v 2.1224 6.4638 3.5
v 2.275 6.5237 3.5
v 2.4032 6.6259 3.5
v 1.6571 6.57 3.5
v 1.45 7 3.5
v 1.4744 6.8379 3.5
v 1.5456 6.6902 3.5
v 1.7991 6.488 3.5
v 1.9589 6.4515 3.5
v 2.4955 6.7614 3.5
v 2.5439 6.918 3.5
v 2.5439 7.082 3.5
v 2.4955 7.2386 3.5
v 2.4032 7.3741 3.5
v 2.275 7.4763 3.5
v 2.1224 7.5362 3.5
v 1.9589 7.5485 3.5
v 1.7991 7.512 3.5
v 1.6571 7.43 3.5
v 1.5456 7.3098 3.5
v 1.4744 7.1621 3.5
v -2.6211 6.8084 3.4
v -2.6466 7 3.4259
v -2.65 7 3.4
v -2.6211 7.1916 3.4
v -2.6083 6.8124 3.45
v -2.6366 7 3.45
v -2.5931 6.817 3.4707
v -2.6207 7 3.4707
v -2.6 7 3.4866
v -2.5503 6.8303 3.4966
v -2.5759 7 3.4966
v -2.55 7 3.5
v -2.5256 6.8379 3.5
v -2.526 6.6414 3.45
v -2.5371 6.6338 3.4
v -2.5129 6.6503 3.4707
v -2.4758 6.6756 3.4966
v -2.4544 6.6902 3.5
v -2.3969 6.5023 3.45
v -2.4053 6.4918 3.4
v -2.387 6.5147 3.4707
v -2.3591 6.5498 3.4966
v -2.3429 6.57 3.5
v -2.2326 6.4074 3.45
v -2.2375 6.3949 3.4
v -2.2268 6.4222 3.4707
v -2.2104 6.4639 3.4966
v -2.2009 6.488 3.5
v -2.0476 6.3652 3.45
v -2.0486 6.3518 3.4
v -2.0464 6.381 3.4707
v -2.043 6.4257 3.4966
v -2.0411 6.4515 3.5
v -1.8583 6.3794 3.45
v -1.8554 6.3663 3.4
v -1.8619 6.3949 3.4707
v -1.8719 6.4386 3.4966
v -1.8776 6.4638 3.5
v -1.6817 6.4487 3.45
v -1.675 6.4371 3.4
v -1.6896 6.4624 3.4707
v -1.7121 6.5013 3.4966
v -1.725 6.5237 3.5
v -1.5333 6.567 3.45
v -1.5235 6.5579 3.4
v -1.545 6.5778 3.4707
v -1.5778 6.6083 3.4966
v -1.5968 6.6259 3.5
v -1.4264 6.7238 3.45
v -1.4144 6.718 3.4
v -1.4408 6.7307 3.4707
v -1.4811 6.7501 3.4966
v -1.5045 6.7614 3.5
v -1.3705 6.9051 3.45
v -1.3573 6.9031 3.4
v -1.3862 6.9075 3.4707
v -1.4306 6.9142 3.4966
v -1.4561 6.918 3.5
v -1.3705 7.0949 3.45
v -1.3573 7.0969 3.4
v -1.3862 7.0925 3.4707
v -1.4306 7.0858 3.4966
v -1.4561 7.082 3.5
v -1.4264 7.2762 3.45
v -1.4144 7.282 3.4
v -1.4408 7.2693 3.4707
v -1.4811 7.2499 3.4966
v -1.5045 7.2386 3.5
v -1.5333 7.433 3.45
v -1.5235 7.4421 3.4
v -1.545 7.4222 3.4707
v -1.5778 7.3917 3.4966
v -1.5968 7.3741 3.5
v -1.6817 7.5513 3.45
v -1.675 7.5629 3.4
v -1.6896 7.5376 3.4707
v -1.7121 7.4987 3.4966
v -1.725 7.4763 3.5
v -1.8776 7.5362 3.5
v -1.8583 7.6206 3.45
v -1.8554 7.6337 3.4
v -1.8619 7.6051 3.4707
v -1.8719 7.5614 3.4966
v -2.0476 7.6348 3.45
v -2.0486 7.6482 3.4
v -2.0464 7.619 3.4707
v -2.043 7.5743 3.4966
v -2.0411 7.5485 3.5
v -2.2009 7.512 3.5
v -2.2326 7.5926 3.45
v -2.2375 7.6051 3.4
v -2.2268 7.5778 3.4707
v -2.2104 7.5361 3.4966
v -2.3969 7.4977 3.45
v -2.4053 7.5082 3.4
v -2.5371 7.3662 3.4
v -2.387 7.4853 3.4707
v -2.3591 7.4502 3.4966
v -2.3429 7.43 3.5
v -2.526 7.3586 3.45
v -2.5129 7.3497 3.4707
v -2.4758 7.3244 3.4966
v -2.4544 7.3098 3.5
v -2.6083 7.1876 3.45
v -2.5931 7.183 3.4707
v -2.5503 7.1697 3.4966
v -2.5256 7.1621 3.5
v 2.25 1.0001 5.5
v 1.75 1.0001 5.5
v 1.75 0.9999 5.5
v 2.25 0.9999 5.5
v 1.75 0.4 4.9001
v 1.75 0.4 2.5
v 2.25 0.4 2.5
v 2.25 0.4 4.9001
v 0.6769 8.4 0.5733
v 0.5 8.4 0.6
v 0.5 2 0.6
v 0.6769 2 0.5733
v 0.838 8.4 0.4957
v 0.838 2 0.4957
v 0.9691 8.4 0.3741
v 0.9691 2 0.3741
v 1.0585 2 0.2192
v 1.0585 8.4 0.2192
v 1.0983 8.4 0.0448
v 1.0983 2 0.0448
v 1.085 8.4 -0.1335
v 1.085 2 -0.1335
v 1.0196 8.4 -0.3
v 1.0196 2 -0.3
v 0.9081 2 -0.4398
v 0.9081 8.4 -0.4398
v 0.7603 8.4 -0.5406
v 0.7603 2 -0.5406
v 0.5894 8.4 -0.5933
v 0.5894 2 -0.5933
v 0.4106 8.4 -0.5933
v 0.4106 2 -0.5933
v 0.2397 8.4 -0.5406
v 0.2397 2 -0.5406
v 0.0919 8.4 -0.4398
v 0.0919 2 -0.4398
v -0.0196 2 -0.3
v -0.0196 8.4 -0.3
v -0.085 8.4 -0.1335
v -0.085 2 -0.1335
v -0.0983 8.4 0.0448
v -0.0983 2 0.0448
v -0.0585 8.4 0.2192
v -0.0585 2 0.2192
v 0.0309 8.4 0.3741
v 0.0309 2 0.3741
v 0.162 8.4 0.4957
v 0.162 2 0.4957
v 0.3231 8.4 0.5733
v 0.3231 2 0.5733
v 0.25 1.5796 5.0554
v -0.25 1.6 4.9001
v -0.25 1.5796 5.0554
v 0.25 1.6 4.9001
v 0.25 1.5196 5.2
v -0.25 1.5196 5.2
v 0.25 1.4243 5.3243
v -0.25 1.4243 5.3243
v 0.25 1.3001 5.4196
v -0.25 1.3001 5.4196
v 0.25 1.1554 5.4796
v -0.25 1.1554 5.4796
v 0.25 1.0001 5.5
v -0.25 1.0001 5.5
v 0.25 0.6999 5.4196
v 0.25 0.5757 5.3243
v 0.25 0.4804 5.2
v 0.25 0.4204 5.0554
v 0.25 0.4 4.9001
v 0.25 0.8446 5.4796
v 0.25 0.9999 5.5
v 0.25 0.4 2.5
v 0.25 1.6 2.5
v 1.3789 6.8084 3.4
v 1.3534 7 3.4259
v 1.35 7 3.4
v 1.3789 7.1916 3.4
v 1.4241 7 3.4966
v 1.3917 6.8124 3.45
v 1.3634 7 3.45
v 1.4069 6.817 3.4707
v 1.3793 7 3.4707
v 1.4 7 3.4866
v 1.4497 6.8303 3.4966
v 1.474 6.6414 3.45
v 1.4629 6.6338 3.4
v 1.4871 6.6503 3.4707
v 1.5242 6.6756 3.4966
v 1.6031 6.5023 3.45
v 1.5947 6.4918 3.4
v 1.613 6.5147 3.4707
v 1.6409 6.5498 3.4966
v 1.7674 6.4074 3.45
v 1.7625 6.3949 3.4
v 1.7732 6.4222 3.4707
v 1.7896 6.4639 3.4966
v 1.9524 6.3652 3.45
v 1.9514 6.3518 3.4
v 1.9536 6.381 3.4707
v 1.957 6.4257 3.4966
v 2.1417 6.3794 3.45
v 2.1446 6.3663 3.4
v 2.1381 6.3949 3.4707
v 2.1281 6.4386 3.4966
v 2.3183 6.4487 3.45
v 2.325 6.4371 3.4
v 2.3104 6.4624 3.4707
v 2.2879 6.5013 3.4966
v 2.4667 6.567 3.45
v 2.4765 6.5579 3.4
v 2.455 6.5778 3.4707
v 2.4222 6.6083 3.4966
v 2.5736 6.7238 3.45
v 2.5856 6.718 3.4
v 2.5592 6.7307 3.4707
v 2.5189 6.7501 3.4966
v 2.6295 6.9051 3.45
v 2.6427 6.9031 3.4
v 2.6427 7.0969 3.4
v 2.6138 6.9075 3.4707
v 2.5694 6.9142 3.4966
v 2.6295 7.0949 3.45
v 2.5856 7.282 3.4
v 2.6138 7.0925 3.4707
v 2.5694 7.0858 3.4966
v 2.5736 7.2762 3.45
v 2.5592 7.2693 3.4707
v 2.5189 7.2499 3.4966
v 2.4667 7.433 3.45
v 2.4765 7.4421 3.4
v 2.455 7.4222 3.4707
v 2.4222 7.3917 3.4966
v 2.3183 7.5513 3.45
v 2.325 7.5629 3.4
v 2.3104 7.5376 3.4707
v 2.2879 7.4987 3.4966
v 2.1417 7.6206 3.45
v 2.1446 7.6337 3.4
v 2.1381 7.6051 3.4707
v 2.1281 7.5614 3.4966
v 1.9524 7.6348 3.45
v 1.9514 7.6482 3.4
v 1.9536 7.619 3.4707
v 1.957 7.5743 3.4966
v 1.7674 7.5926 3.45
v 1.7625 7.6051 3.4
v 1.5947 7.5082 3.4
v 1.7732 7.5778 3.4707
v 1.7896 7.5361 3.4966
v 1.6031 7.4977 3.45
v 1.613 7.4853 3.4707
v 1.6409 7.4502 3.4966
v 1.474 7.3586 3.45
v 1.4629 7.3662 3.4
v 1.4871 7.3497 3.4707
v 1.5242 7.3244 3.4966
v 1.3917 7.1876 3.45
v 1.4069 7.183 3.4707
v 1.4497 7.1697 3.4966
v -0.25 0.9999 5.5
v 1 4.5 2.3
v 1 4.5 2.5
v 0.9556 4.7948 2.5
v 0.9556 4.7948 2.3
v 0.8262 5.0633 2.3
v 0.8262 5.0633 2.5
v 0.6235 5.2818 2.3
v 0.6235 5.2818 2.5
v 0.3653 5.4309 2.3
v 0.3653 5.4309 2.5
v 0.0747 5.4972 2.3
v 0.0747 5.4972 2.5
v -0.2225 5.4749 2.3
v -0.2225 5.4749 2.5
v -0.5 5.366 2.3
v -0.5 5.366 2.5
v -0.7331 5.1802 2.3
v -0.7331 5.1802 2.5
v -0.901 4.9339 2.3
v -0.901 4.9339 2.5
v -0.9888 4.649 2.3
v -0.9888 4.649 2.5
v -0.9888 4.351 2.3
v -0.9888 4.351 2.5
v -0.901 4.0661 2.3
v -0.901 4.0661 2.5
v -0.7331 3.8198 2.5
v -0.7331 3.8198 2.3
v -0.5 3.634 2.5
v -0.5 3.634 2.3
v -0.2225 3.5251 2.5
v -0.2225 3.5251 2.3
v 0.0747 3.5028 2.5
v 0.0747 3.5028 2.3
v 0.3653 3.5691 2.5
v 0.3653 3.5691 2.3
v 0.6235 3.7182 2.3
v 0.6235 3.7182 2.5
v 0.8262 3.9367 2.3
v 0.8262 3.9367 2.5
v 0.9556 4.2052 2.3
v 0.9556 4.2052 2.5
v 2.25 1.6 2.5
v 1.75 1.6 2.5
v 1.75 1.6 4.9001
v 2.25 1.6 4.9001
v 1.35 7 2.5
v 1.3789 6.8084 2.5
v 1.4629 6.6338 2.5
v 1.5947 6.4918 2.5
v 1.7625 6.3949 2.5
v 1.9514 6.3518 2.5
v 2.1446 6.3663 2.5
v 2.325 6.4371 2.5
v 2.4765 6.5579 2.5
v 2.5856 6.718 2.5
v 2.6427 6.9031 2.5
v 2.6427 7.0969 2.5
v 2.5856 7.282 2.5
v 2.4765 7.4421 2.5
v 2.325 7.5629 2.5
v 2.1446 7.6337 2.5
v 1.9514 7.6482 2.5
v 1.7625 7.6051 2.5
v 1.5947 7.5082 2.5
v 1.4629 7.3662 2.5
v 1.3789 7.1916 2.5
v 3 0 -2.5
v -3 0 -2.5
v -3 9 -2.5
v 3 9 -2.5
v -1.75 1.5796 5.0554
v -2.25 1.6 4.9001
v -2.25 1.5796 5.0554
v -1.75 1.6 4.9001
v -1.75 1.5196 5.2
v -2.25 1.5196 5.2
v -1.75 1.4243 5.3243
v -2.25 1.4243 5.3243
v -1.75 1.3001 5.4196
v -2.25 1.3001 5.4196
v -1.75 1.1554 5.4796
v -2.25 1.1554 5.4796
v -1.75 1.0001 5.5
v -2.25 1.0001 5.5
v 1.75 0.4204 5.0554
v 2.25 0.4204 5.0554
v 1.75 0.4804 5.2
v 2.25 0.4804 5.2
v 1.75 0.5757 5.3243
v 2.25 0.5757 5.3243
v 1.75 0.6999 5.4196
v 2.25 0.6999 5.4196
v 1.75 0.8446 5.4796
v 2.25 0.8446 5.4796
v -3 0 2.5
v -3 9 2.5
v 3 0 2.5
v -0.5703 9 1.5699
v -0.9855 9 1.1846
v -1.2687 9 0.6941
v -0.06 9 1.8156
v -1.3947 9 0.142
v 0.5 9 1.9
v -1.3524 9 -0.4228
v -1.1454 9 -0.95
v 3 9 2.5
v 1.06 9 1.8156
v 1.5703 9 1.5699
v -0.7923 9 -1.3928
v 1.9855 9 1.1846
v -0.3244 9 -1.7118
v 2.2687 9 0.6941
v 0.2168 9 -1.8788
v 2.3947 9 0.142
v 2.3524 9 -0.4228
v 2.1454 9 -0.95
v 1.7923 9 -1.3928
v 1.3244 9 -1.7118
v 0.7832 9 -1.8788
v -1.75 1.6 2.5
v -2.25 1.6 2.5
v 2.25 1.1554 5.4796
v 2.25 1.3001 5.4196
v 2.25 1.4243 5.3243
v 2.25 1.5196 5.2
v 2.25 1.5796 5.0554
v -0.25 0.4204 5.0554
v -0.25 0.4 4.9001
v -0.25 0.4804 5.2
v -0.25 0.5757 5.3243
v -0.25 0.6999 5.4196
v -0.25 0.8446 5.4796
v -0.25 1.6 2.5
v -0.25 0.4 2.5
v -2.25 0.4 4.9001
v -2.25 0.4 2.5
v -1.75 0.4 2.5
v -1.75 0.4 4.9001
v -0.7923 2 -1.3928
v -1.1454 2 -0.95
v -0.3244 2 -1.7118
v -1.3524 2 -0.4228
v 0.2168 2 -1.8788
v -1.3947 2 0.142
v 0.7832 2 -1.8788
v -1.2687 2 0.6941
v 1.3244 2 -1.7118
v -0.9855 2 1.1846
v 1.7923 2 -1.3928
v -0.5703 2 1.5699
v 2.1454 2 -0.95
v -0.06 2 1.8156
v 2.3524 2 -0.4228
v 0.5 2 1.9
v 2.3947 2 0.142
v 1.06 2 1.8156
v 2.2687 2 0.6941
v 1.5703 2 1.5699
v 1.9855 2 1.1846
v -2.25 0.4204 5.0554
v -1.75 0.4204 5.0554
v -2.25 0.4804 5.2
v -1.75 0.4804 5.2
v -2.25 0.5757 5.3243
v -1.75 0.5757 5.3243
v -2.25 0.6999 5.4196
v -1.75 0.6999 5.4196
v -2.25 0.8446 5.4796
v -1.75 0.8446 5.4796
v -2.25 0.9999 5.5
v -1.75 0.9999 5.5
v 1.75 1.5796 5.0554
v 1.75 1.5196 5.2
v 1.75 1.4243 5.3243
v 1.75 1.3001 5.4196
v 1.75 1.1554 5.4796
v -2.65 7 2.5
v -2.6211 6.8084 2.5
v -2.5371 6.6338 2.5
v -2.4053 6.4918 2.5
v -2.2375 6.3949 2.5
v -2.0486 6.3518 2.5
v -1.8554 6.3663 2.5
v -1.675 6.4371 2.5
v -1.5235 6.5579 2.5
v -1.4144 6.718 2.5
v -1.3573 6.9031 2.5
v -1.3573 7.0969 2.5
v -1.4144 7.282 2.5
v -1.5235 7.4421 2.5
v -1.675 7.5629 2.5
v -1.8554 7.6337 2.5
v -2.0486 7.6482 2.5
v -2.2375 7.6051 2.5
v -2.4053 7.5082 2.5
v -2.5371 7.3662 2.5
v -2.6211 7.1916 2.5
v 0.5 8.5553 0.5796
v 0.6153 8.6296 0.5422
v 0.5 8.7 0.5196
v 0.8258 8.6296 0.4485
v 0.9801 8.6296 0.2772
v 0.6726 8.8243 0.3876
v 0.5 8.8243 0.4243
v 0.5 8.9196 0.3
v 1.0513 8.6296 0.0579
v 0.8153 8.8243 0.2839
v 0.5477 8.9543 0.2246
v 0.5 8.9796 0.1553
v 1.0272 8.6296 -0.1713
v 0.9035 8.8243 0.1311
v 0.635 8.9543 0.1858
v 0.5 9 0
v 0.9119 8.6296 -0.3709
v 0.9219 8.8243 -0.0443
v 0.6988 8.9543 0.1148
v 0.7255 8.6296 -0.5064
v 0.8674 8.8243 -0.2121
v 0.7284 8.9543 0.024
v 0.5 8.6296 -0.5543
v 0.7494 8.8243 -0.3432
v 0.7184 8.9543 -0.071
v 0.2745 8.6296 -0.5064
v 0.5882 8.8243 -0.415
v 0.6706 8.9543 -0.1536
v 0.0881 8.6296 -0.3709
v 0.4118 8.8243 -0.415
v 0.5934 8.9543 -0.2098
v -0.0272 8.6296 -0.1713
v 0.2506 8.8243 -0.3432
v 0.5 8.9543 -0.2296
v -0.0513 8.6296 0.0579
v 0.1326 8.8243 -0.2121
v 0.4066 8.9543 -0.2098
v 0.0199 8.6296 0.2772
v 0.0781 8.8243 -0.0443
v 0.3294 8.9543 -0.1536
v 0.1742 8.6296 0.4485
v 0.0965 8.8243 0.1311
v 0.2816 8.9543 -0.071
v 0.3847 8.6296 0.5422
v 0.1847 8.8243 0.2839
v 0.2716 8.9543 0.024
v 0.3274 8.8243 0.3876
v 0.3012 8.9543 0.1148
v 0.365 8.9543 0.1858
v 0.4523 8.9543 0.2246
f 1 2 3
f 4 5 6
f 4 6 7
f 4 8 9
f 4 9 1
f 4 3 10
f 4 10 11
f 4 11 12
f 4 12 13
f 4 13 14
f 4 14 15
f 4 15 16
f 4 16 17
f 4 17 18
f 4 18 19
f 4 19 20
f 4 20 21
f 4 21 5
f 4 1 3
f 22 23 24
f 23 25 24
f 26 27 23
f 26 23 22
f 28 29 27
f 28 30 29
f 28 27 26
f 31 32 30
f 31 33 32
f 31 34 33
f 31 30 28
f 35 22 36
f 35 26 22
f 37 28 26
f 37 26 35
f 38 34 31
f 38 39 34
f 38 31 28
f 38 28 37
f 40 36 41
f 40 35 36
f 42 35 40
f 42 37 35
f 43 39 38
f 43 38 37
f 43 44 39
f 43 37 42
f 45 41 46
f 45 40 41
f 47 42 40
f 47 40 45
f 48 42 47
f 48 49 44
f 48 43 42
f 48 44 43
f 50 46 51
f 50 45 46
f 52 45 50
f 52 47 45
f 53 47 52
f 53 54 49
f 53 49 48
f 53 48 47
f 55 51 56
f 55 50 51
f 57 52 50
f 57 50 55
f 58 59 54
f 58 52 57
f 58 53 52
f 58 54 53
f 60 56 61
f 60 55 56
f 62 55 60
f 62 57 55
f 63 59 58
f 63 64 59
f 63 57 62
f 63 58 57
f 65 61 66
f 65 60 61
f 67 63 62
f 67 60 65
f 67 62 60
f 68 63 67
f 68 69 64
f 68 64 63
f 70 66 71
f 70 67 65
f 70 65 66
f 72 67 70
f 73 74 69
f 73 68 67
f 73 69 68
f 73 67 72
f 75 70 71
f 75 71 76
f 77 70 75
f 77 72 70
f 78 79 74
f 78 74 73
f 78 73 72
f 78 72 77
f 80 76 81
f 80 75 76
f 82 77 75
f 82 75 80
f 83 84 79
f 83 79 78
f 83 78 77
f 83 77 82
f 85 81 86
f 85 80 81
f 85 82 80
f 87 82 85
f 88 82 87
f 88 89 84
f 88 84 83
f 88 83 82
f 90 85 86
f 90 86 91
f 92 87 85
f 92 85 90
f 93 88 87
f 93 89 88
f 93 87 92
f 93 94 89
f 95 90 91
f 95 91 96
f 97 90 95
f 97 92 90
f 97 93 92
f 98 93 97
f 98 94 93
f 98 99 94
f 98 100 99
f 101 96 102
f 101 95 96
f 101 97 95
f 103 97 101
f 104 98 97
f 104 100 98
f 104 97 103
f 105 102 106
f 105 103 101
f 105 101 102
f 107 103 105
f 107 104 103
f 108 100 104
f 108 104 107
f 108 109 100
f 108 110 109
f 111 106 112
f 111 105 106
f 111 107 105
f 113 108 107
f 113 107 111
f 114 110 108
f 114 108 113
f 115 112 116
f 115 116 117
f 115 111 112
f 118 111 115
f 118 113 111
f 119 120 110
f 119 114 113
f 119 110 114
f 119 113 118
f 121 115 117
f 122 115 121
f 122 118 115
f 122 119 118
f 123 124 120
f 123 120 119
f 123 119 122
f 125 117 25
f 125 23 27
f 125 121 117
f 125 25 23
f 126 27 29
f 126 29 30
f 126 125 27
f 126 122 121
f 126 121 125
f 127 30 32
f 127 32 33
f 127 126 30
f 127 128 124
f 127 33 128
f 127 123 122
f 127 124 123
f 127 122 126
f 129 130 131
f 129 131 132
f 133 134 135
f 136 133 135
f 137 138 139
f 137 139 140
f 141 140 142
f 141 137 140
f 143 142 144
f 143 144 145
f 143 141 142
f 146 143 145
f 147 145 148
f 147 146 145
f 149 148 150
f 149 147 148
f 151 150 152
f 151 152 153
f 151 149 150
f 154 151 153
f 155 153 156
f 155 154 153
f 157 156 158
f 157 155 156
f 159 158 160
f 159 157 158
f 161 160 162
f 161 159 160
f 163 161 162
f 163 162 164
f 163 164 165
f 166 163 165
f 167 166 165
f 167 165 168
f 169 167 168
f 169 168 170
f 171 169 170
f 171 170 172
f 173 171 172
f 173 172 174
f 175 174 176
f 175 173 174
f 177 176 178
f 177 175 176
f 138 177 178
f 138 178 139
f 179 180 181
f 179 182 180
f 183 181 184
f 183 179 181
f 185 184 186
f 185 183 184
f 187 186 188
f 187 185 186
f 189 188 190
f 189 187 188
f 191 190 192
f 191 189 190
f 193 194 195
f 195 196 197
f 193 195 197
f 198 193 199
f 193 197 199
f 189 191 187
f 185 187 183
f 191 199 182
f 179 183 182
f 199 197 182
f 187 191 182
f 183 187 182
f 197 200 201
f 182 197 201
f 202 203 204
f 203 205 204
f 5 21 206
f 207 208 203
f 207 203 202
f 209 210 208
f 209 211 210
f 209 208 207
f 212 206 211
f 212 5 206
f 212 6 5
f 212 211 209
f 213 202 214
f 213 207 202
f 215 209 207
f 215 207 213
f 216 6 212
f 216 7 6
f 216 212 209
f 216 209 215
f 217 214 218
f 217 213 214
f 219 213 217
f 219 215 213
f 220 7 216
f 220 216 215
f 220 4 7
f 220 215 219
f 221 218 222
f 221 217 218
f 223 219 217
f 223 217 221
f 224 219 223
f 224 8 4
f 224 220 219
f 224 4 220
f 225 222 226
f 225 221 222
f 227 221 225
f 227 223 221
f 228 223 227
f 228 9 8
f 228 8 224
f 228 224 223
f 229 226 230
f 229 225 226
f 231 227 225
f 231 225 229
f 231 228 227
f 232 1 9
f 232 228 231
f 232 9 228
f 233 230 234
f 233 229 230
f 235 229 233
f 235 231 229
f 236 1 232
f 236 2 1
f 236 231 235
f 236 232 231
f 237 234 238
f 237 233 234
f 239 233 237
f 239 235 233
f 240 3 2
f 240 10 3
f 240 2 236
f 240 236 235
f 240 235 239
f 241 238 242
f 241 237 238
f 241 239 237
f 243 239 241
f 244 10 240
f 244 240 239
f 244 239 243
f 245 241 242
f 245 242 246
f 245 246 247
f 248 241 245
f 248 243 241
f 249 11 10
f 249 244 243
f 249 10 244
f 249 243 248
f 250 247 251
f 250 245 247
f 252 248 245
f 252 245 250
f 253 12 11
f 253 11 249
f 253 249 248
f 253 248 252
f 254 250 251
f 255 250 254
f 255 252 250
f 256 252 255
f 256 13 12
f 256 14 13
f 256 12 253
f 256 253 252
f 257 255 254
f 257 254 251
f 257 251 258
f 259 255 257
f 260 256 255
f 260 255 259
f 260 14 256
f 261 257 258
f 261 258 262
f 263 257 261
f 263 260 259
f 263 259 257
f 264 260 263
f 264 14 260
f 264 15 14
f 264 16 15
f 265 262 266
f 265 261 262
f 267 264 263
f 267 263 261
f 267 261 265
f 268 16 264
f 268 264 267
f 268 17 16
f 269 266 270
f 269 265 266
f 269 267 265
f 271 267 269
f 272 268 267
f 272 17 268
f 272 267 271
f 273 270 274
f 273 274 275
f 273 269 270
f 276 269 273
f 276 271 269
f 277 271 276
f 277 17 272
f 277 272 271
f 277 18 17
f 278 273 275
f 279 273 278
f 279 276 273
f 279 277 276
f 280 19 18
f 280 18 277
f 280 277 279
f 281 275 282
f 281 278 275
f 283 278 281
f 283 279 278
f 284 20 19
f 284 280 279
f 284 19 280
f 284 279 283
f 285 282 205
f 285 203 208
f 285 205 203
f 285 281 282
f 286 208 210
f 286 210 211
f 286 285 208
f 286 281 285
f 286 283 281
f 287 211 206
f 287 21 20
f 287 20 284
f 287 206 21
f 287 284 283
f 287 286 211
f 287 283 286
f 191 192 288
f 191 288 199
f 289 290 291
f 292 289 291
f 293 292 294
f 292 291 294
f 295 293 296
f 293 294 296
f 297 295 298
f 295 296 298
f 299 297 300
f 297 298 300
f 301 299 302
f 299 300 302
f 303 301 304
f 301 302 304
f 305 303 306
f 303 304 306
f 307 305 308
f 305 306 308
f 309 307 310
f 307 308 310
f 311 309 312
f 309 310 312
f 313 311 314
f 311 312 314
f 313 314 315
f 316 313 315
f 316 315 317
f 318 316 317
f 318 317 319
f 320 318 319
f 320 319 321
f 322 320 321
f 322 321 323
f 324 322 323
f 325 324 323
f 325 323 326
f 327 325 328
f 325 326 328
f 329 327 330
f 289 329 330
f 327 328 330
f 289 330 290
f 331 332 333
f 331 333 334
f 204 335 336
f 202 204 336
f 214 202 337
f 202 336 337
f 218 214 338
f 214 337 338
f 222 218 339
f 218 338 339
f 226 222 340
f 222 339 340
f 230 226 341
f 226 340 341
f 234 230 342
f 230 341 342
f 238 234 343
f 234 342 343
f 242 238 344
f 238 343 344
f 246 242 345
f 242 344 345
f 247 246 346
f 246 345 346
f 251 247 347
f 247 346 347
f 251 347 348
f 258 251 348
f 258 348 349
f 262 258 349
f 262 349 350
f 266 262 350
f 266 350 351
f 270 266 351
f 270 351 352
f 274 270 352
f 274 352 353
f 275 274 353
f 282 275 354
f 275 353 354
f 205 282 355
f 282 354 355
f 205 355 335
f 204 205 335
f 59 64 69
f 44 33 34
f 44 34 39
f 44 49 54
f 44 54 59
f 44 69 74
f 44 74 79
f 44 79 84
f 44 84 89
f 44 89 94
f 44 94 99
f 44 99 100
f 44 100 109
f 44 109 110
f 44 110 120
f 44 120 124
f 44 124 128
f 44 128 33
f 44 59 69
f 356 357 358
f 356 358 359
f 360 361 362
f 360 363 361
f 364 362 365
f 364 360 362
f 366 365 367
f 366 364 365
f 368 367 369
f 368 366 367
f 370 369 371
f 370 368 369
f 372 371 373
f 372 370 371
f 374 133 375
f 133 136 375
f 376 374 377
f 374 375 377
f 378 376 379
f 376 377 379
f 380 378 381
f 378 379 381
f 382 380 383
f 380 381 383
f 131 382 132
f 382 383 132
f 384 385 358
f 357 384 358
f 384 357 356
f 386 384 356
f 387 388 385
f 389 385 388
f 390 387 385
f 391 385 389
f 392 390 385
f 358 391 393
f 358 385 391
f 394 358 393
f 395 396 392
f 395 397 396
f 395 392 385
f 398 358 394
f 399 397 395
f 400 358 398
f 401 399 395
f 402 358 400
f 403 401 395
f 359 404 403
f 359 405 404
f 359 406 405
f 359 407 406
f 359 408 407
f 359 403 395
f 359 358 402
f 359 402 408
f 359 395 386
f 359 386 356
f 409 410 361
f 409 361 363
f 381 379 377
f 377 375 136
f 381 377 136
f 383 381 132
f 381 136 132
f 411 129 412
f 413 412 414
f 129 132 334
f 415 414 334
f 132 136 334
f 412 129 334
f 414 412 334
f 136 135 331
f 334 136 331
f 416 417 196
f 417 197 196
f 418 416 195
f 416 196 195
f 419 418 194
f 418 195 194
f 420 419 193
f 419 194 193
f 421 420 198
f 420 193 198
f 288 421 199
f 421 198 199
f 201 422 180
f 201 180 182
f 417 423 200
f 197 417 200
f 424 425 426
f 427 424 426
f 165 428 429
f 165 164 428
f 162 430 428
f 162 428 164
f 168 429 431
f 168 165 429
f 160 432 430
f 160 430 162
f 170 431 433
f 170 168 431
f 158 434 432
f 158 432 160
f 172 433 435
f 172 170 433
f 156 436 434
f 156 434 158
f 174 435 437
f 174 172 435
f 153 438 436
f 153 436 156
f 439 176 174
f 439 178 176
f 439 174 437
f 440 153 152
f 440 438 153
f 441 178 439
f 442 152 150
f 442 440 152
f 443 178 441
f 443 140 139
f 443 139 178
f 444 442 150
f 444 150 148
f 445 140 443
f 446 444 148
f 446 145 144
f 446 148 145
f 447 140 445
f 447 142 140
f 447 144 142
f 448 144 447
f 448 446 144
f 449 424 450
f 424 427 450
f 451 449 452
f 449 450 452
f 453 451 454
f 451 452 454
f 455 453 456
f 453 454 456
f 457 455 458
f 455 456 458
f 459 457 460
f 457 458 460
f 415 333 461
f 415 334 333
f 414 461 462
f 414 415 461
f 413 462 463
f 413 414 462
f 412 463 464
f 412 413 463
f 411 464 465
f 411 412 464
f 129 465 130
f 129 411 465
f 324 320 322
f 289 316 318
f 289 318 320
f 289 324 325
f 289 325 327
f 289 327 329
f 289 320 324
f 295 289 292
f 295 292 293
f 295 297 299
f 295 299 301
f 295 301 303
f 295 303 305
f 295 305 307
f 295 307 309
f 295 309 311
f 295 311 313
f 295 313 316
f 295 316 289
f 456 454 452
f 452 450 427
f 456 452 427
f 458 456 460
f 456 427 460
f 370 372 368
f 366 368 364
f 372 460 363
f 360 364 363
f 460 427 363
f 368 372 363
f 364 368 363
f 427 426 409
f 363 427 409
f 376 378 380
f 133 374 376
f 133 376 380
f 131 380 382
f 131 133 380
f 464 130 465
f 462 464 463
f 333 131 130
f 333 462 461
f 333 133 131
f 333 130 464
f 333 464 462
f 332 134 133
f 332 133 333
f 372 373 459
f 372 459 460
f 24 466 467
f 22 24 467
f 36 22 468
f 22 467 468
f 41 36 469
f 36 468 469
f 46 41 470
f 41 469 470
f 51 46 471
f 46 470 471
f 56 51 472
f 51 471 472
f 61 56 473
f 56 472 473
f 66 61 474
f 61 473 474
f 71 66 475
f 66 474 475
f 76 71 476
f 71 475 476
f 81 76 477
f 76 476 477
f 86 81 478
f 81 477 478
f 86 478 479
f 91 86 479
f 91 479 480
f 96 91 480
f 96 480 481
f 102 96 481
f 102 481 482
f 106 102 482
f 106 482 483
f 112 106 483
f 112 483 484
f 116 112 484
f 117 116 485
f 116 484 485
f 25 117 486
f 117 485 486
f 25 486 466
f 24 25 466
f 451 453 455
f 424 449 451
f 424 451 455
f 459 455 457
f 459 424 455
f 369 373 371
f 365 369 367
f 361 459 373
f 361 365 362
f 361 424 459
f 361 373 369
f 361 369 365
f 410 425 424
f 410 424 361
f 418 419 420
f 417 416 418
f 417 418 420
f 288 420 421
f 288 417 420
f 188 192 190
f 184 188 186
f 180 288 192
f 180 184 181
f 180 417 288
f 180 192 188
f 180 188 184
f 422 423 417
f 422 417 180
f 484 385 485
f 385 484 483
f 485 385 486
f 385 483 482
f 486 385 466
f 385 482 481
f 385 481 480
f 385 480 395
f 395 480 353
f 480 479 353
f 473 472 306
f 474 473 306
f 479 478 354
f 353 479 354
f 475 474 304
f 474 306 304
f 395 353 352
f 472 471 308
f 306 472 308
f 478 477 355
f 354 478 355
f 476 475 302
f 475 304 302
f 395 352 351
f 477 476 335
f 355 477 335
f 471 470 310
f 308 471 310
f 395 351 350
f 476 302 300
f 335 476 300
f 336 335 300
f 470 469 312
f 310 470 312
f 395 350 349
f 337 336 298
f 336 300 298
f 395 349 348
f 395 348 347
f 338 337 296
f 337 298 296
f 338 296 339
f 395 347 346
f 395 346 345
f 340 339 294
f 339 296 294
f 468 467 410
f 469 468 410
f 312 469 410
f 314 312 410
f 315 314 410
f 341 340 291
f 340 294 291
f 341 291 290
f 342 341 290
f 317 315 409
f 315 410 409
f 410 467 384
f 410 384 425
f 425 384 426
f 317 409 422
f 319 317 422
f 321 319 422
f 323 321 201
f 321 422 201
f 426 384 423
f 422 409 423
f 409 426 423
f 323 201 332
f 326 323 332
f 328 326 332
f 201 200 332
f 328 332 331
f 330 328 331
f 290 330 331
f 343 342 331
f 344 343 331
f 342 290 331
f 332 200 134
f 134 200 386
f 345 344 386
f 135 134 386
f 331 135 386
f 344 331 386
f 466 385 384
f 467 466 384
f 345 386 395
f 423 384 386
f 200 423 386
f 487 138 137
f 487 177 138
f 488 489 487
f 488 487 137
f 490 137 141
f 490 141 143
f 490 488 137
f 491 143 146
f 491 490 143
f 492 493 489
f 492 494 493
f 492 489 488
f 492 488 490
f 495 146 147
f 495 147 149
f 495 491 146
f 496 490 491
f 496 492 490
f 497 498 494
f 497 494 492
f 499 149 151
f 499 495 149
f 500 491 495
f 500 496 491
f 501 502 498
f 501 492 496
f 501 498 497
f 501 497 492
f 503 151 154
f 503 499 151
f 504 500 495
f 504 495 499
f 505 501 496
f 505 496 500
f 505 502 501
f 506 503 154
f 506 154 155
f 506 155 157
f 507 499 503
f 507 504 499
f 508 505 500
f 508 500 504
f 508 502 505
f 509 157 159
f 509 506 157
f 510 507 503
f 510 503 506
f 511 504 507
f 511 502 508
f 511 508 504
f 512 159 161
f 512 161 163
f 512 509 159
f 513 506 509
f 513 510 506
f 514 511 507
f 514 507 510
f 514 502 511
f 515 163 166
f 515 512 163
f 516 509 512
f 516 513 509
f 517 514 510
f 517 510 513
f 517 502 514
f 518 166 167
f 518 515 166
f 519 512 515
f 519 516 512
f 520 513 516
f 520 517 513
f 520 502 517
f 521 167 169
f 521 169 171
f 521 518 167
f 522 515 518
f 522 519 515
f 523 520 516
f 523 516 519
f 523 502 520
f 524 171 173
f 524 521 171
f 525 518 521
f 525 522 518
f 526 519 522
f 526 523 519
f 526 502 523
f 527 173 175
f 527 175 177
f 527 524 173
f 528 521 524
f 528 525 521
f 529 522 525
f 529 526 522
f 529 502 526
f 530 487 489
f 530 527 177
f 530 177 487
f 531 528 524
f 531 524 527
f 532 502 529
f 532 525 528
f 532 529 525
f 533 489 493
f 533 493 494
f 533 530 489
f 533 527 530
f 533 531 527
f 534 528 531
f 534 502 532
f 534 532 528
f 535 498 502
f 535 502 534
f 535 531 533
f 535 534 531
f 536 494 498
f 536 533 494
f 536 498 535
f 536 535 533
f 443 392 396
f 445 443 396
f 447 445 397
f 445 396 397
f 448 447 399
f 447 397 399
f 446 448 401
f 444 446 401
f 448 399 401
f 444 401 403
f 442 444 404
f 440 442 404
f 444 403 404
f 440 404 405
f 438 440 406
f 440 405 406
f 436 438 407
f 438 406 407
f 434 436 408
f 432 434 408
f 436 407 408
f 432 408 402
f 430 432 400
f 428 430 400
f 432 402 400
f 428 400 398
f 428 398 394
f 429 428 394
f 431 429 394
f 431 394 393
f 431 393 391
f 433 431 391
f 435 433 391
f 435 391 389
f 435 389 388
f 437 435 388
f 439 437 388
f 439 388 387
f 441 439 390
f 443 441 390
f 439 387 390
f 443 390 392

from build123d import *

# Parameters (mm, degrees)
SKETCH2_W           = 6
SKETCH2_H           = 5
BOSS_EXTRUDE1_DEPTH = 9
SKETCH3_R           = 1.9
SKETCH3_R_2         = 0.6
CUT_EXTRUDE1_DEPTH  = 7
FILLET1_R           = 0.6
SKETCH4_W           = 0.5
SKETCH4_H           = 1.2
BOSS_EXTRUDE2_DEPTH = 3
FILLET2_R           = 0.6
SKETCH5_R           = 0.65
BOSS_EXTRUDE3_DEPTH = 1
FILLET3_R           = 0.1
SKETCH6_R           = 1
CUT_EXTRUDE2_DEPTH  = 0.2


with BuildPart() as part:
    # Sketch2 → Boss-Extrude1 (new body)
    with BuildSketch(Plane(origin=(0, 0, 0), x_dir=(1, 0, 0), z_dir=(0, 1, 0))):
        Rectangle(SKETCH2_W, SKETCH2_H)
    extrude(amount=BOSS_EXTRUDE1_DEPTH)

    # Sketch3 → Cut-Extrude1 (cut)
    with BuildSketch(Plane(origin=(0, 9, 0), x_dir=(1, 0, 0), z_dir=(0, 1, 0))):
        with Locations(Location((0.5, 0, 0), (0, 0, 270))):
            Circle(SKETCH3_R)
        with Locations(Location((0.5, 0, 0), (0, 0, 270))):
            Circle(SKETCH3_R_2, mode=Mode.SUBTRACT)
    extrude(amount=-CUT_EXTRUDE1_DEPTH, mode=Mode.SUBTRACT)

    # Fillet1
    fillet1_edges = [part.edges().sort_by_distance(p)[0] for p in [
        (0.5, 9, -0.6),
    ]]
    fillet(fillet1_edges, radius=FILLET1_R)

    # Sketch4 → Boss-Extrude2 (add)
    with BuildSketch(Plane.XY.offset(2.5)):
        with Locations((2, 1)):
            Rectangle(SKETCH4_W, SKETCH4_H)
        with Locations((0, 1)):
            Rectangle(SKETCH4_W, SKETCH4_H)
        with Locations((-2, 1)):
            Rectangle(SKETCH4_W, SKETCH4_H)
    extrude(amount=BOSS_EXTRUDE2_DEPTH)

    # Fillet2
    fillet2_edges = [part.edges().sort_by_distance(p)[0] for p in [
        (-2, 0.4, 5.5),
        (-2, 1.6, 5.5),
        (0, 1.6, 5.5),
        (0, 0.4, 5.5),
        (2, 0.4, 5.5),
        (2, 1.6, 5.5),
    ]]
    fillet(fillet2_edges, radius=FILLET2_R - 0.0001)  # a hair under: the kernel refuses the full size

    # Sketch5 → Boss-Extrude3 (add)
    with BuildSketch(Plane.XY.offset(2.5)):
        with Locations(Location((2, 7, 0), (0, 0, 180))):
            Circle(SKETCH5_R)
        with Locations(Location((-2, 7, 0), (0, 0, 180))):
            Circle(SKETCH5_R)
    extrude(amount=BOSS_EXTRUDE3_DEPTH)

    # Fillet3
    fillet3_edges = [part.edges().sort_by_distance(p)[0] for p in [
        (2.65, 7, 3.5),
        (-1.35, 7, 3.5),
    ]]
    fillet(fillet3_edges, radius=FILLET3_R)

    # Sketch6 → Cut-Extrude2 (cut)
    with BuildSketch(Plane.XY.offset(2.5)):
        with Locations((0, 4.5)):
            Circle(SKETCH6_R)
    extrude(amount=-CUT_EXTRUDE2_DEPTH, mode=Mode.SUBTRACT)


solid = part.part
